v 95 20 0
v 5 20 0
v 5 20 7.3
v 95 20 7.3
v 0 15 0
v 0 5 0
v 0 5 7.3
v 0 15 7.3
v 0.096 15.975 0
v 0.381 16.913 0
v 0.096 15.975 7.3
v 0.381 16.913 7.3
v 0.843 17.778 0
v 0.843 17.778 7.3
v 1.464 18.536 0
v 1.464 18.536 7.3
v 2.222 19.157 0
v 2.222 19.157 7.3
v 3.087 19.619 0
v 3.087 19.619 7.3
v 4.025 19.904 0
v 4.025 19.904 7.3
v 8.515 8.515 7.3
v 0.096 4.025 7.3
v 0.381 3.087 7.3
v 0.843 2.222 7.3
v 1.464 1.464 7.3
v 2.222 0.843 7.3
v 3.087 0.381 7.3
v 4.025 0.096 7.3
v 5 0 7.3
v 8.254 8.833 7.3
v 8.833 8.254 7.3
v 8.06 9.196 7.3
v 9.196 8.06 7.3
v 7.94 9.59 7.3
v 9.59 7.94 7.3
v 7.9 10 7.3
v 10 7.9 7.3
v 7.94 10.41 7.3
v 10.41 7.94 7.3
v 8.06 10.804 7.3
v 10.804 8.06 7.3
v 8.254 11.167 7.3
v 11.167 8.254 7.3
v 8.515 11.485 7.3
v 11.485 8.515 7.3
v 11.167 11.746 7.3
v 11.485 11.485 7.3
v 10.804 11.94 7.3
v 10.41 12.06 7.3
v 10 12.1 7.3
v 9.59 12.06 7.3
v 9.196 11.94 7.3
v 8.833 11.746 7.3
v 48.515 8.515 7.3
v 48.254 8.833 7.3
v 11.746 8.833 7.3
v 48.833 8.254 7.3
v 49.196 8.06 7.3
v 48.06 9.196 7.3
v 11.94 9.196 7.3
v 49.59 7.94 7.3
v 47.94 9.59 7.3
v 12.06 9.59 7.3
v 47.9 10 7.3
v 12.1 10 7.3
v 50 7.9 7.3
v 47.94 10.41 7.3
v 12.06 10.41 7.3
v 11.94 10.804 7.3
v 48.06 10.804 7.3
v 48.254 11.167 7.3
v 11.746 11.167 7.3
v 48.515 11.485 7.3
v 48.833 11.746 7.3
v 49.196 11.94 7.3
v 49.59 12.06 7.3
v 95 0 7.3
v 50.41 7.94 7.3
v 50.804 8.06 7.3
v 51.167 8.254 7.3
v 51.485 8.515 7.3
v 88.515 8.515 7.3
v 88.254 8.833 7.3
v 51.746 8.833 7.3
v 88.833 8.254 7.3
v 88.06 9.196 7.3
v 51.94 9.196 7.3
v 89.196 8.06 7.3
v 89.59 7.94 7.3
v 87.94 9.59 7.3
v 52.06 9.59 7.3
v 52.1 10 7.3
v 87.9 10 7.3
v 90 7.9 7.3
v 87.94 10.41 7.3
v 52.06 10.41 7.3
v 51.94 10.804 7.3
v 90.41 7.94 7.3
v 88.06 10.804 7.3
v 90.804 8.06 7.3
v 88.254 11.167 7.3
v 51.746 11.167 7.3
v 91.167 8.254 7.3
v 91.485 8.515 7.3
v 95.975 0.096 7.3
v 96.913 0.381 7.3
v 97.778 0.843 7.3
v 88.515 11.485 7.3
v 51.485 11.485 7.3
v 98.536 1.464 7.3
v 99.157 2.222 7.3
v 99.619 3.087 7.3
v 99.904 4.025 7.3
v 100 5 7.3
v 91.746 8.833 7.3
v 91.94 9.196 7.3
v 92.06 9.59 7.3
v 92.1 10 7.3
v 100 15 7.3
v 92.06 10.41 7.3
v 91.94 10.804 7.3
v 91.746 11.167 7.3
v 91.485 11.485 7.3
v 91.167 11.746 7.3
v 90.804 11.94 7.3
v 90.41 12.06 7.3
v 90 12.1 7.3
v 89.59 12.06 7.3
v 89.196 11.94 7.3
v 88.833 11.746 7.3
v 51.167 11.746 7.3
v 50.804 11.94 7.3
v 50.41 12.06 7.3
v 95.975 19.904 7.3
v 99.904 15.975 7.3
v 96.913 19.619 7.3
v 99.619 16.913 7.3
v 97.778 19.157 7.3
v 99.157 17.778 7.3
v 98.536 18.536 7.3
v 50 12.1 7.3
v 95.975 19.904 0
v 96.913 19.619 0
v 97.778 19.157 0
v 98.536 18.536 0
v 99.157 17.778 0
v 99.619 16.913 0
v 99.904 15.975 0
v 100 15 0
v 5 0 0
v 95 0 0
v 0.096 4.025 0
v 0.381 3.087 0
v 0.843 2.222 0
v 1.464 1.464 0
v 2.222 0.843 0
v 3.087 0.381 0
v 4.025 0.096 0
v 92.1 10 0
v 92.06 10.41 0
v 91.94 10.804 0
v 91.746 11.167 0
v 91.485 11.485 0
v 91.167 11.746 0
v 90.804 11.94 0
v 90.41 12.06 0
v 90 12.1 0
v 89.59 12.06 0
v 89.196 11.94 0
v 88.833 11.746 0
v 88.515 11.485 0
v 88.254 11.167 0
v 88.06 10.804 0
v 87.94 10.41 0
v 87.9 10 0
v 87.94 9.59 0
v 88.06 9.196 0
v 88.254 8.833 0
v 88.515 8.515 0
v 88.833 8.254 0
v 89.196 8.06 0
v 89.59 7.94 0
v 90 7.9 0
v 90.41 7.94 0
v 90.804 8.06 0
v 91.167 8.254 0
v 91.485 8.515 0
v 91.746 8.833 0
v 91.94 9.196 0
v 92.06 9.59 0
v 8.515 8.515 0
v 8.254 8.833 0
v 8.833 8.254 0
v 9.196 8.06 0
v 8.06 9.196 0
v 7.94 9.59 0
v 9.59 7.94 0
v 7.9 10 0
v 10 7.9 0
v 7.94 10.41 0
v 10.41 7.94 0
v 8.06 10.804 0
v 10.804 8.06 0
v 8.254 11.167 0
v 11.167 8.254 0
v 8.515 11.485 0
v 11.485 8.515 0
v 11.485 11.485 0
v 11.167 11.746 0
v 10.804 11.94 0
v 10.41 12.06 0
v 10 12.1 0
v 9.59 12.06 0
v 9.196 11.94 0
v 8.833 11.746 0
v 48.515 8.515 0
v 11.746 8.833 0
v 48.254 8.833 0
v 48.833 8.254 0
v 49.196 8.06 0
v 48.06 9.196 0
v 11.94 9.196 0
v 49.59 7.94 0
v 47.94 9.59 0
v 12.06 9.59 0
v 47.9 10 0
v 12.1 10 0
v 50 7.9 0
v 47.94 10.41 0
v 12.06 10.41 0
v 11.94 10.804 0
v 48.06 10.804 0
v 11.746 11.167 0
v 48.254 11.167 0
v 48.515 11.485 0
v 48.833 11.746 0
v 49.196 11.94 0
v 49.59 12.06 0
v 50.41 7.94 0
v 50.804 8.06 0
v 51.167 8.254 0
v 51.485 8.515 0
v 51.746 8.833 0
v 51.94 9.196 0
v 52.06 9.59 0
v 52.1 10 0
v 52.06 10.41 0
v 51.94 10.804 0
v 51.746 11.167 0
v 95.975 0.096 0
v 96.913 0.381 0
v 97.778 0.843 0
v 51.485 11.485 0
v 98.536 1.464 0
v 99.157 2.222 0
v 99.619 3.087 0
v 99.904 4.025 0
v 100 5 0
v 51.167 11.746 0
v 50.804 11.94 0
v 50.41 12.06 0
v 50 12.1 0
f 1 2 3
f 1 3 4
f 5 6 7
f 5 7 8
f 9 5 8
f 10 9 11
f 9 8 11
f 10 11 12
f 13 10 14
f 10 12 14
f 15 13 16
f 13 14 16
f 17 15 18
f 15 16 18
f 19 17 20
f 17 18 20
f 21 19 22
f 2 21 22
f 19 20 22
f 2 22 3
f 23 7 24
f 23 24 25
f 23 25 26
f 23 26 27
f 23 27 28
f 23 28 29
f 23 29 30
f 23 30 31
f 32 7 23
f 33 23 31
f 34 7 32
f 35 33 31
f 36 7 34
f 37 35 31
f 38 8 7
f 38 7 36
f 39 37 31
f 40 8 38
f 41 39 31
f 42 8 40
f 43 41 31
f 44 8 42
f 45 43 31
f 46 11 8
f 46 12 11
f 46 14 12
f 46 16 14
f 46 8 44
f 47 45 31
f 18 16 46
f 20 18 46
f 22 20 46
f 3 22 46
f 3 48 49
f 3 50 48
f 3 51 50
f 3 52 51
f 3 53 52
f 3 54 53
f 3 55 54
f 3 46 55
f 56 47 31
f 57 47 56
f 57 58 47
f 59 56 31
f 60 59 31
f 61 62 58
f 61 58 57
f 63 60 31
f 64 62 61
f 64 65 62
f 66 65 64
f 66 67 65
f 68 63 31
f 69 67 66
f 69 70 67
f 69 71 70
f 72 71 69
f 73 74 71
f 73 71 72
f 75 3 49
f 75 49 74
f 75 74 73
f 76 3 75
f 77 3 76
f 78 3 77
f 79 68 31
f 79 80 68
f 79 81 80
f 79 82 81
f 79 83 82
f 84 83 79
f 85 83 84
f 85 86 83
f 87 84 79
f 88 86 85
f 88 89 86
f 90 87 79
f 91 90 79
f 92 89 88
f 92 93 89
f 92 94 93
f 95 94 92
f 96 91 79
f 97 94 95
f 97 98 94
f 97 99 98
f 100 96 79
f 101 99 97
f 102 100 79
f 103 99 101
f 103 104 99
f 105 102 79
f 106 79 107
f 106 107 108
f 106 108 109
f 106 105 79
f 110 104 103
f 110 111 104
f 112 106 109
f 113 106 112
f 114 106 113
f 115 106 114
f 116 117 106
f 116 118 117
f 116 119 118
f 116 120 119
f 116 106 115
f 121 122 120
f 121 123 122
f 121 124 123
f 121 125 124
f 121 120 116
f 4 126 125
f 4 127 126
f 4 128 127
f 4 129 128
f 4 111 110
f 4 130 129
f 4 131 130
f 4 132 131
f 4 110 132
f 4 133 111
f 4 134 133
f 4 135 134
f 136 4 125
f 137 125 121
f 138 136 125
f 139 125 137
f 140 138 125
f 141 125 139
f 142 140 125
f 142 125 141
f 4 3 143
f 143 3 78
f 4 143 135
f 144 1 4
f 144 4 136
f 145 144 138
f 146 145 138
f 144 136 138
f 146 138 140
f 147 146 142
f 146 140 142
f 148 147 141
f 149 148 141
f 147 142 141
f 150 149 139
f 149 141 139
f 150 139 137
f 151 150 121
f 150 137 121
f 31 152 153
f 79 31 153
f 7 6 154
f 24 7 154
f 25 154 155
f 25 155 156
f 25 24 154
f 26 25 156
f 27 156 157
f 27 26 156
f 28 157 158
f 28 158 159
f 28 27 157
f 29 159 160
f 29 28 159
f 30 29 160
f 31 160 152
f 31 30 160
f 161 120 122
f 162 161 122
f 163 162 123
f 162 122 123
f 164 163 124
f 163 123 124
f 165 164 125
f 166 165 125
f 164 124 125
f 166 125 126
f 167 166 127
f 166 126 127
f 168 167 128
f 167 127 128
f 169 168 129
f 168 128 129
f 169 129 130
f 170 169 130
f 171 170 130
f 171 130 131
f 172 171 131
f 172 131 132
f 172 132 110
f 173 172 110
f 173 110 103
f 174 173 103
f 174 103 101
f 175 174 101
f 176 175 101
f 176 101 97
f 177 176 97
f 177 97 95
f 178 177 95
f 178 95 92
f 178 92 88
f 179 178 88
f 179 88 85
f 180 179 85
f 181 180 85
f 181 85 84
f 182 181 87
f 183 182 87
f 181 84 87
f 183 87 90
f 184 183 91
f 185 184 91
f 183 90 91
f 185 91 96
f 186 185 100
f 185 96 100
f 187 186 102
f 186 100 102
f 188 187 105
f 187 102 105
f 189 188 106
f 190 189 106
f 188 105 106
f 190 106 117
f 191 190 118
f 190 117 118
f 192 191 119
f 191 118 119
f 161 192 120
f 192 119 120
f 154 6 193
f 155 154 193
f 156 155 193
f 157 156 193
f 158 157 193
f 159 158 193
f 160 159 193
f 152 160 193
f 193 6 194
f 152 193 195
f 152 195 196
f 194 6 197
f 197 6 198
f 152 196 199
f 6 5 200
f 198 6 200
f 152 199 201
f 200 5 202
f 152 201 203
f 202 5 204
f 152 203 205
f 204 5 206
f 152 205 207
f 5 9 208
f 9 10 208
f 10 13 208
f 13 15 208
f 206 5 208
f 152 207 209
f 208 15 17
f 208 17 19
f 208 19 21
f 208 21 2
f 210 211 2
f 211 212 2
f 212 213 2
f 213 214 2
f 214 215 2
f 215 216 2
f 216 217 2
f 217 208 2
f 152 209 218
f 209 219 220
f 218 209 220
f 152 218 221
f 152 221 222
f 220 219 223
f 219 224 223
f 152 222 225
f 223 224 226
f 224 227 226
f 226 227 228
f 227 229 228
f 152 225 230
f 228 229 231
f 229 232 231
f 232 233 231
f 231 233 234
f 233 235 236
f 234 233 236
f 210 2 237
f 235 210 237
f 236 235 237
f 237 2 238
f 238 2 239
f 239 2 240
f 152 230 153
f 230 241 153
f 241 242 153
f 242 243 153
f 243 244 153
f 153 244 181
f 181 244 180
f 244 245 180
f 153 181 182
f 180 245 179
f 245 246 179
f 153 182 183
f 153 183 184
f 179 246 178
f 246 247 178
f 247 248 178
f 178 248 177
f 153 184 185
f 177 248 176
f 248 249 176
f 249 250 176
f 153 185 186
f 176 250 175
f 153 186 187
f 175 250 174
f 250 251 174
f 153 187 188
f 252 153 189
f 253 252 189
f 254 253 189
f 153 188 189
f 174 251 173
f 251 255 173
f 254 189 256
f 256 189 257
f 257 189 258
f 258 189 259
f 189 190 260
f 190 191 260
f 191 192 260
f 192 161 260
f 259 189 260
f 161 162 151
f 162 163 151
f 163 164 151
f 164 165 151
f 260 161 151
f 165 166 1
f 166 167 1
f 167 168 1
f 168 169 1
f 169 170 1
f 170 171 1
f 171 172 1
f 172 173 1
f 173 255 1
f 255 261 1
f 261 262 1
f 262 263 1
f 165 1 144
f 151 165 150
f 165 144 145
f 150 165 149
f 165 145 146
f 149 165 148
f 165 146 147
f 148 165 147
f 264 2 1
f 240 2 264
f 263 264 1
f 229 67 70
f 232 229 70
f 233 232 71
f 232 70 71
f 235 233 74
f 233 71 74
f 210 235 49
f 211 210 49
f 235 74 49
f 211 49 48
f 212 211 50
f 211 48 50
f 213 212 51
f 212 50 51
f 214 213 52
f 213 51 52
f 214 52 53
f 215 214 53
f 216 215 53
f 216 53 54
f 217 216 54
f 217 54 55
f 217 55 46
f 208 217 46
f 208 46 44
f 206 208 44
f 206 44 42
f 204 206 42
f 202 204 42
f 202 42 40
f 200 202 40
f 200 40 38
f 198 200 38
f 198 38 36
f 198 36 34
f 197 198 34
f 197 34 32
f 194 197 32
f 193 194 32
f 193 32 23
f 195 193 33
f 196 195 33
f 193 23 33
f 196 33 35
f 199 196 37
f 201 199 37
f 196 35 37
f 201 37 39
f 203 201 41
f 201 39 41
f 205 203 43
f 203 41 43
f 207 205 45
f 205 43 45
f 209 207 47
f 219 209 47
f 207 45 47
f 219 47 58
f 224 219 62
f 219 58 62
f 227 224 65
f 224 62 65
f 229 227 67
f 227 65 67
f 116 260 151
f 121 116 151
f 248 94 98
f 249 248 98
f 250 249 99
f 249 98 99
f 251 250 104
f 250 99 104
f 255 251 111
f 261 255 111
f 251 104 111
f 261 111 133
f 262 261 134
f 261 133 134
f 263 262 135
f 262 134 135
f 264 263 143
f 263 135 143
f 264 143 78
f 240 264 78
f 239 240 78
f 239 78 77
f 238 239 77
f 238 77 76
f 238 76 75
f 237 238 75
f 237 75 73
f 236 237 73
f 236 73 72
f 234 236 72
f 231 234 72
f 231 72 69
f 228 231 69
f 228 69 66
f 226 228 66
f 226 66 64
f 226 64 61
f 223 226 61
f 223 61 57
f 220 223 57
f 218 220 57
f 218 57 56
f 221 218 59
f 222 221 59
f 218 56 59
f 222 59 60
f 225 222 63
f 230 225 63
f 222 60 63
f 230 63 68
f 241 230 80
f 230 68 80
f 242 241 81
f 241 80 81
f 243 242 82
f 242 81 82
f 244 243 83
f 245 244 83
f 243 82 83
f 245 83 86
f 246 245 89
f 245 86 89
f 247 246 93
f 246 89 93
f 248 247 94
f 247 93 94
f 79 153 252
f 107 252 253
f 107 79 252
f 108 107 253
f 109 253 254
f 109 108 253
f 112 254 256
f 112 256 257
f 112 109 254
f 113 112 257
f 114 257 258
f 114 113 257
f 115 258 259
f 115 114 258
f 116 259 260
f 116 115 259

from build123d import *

# Parameters (mm, degrees)
SKETCH_1_W          = 100
SKETCH_1_H          = 20
EXTRUDE_1_DEPTH     = 7.3
SKETCH_2_R          = 2.1
CUT_EXTRUDE_1_DEPTH = 103.241332151
FILLET_1_R          = 5


with BuildPart() as part:
    # 草图1 → 凸台-拉伸1 (new body)
    with BuildSketch(Plane.XY):
        with Locations((50, 10)):
            Rectangle(SKETCH_1_W, SKETCH_1_H)
    extrude(amount=EXTRUDE_1_DEPTH)

    # 草图2 → 切除-拉伸1 (cut, through all)
    with BuildSketch(Plane.XY.offset(7.3)):
        with Locations((10, 10)):
            Circle(SKETCH_2_R)
        with Locations((50, 10)):
            Circle(SKETCH_2_R)
        with Locations((90, 10)):
            Circle(SKETCH_2_R)
    extrude(amount=-CUT_EXTRUDE_1_DEPTH, mode=Mode.SUBTRACT)

    # 圆角1
    fillet_1_edges = [part.edges().sort_by_distance(p)[0] for p in [
        (0, 20, 3.65),
        (100, 20, 3.65),
        (100, 0, 3.65),
        (0, 0, 3.65),
    ]]
    fillet(fillet_1_edges, radius=FILLET_1_R)


solid = part.part
